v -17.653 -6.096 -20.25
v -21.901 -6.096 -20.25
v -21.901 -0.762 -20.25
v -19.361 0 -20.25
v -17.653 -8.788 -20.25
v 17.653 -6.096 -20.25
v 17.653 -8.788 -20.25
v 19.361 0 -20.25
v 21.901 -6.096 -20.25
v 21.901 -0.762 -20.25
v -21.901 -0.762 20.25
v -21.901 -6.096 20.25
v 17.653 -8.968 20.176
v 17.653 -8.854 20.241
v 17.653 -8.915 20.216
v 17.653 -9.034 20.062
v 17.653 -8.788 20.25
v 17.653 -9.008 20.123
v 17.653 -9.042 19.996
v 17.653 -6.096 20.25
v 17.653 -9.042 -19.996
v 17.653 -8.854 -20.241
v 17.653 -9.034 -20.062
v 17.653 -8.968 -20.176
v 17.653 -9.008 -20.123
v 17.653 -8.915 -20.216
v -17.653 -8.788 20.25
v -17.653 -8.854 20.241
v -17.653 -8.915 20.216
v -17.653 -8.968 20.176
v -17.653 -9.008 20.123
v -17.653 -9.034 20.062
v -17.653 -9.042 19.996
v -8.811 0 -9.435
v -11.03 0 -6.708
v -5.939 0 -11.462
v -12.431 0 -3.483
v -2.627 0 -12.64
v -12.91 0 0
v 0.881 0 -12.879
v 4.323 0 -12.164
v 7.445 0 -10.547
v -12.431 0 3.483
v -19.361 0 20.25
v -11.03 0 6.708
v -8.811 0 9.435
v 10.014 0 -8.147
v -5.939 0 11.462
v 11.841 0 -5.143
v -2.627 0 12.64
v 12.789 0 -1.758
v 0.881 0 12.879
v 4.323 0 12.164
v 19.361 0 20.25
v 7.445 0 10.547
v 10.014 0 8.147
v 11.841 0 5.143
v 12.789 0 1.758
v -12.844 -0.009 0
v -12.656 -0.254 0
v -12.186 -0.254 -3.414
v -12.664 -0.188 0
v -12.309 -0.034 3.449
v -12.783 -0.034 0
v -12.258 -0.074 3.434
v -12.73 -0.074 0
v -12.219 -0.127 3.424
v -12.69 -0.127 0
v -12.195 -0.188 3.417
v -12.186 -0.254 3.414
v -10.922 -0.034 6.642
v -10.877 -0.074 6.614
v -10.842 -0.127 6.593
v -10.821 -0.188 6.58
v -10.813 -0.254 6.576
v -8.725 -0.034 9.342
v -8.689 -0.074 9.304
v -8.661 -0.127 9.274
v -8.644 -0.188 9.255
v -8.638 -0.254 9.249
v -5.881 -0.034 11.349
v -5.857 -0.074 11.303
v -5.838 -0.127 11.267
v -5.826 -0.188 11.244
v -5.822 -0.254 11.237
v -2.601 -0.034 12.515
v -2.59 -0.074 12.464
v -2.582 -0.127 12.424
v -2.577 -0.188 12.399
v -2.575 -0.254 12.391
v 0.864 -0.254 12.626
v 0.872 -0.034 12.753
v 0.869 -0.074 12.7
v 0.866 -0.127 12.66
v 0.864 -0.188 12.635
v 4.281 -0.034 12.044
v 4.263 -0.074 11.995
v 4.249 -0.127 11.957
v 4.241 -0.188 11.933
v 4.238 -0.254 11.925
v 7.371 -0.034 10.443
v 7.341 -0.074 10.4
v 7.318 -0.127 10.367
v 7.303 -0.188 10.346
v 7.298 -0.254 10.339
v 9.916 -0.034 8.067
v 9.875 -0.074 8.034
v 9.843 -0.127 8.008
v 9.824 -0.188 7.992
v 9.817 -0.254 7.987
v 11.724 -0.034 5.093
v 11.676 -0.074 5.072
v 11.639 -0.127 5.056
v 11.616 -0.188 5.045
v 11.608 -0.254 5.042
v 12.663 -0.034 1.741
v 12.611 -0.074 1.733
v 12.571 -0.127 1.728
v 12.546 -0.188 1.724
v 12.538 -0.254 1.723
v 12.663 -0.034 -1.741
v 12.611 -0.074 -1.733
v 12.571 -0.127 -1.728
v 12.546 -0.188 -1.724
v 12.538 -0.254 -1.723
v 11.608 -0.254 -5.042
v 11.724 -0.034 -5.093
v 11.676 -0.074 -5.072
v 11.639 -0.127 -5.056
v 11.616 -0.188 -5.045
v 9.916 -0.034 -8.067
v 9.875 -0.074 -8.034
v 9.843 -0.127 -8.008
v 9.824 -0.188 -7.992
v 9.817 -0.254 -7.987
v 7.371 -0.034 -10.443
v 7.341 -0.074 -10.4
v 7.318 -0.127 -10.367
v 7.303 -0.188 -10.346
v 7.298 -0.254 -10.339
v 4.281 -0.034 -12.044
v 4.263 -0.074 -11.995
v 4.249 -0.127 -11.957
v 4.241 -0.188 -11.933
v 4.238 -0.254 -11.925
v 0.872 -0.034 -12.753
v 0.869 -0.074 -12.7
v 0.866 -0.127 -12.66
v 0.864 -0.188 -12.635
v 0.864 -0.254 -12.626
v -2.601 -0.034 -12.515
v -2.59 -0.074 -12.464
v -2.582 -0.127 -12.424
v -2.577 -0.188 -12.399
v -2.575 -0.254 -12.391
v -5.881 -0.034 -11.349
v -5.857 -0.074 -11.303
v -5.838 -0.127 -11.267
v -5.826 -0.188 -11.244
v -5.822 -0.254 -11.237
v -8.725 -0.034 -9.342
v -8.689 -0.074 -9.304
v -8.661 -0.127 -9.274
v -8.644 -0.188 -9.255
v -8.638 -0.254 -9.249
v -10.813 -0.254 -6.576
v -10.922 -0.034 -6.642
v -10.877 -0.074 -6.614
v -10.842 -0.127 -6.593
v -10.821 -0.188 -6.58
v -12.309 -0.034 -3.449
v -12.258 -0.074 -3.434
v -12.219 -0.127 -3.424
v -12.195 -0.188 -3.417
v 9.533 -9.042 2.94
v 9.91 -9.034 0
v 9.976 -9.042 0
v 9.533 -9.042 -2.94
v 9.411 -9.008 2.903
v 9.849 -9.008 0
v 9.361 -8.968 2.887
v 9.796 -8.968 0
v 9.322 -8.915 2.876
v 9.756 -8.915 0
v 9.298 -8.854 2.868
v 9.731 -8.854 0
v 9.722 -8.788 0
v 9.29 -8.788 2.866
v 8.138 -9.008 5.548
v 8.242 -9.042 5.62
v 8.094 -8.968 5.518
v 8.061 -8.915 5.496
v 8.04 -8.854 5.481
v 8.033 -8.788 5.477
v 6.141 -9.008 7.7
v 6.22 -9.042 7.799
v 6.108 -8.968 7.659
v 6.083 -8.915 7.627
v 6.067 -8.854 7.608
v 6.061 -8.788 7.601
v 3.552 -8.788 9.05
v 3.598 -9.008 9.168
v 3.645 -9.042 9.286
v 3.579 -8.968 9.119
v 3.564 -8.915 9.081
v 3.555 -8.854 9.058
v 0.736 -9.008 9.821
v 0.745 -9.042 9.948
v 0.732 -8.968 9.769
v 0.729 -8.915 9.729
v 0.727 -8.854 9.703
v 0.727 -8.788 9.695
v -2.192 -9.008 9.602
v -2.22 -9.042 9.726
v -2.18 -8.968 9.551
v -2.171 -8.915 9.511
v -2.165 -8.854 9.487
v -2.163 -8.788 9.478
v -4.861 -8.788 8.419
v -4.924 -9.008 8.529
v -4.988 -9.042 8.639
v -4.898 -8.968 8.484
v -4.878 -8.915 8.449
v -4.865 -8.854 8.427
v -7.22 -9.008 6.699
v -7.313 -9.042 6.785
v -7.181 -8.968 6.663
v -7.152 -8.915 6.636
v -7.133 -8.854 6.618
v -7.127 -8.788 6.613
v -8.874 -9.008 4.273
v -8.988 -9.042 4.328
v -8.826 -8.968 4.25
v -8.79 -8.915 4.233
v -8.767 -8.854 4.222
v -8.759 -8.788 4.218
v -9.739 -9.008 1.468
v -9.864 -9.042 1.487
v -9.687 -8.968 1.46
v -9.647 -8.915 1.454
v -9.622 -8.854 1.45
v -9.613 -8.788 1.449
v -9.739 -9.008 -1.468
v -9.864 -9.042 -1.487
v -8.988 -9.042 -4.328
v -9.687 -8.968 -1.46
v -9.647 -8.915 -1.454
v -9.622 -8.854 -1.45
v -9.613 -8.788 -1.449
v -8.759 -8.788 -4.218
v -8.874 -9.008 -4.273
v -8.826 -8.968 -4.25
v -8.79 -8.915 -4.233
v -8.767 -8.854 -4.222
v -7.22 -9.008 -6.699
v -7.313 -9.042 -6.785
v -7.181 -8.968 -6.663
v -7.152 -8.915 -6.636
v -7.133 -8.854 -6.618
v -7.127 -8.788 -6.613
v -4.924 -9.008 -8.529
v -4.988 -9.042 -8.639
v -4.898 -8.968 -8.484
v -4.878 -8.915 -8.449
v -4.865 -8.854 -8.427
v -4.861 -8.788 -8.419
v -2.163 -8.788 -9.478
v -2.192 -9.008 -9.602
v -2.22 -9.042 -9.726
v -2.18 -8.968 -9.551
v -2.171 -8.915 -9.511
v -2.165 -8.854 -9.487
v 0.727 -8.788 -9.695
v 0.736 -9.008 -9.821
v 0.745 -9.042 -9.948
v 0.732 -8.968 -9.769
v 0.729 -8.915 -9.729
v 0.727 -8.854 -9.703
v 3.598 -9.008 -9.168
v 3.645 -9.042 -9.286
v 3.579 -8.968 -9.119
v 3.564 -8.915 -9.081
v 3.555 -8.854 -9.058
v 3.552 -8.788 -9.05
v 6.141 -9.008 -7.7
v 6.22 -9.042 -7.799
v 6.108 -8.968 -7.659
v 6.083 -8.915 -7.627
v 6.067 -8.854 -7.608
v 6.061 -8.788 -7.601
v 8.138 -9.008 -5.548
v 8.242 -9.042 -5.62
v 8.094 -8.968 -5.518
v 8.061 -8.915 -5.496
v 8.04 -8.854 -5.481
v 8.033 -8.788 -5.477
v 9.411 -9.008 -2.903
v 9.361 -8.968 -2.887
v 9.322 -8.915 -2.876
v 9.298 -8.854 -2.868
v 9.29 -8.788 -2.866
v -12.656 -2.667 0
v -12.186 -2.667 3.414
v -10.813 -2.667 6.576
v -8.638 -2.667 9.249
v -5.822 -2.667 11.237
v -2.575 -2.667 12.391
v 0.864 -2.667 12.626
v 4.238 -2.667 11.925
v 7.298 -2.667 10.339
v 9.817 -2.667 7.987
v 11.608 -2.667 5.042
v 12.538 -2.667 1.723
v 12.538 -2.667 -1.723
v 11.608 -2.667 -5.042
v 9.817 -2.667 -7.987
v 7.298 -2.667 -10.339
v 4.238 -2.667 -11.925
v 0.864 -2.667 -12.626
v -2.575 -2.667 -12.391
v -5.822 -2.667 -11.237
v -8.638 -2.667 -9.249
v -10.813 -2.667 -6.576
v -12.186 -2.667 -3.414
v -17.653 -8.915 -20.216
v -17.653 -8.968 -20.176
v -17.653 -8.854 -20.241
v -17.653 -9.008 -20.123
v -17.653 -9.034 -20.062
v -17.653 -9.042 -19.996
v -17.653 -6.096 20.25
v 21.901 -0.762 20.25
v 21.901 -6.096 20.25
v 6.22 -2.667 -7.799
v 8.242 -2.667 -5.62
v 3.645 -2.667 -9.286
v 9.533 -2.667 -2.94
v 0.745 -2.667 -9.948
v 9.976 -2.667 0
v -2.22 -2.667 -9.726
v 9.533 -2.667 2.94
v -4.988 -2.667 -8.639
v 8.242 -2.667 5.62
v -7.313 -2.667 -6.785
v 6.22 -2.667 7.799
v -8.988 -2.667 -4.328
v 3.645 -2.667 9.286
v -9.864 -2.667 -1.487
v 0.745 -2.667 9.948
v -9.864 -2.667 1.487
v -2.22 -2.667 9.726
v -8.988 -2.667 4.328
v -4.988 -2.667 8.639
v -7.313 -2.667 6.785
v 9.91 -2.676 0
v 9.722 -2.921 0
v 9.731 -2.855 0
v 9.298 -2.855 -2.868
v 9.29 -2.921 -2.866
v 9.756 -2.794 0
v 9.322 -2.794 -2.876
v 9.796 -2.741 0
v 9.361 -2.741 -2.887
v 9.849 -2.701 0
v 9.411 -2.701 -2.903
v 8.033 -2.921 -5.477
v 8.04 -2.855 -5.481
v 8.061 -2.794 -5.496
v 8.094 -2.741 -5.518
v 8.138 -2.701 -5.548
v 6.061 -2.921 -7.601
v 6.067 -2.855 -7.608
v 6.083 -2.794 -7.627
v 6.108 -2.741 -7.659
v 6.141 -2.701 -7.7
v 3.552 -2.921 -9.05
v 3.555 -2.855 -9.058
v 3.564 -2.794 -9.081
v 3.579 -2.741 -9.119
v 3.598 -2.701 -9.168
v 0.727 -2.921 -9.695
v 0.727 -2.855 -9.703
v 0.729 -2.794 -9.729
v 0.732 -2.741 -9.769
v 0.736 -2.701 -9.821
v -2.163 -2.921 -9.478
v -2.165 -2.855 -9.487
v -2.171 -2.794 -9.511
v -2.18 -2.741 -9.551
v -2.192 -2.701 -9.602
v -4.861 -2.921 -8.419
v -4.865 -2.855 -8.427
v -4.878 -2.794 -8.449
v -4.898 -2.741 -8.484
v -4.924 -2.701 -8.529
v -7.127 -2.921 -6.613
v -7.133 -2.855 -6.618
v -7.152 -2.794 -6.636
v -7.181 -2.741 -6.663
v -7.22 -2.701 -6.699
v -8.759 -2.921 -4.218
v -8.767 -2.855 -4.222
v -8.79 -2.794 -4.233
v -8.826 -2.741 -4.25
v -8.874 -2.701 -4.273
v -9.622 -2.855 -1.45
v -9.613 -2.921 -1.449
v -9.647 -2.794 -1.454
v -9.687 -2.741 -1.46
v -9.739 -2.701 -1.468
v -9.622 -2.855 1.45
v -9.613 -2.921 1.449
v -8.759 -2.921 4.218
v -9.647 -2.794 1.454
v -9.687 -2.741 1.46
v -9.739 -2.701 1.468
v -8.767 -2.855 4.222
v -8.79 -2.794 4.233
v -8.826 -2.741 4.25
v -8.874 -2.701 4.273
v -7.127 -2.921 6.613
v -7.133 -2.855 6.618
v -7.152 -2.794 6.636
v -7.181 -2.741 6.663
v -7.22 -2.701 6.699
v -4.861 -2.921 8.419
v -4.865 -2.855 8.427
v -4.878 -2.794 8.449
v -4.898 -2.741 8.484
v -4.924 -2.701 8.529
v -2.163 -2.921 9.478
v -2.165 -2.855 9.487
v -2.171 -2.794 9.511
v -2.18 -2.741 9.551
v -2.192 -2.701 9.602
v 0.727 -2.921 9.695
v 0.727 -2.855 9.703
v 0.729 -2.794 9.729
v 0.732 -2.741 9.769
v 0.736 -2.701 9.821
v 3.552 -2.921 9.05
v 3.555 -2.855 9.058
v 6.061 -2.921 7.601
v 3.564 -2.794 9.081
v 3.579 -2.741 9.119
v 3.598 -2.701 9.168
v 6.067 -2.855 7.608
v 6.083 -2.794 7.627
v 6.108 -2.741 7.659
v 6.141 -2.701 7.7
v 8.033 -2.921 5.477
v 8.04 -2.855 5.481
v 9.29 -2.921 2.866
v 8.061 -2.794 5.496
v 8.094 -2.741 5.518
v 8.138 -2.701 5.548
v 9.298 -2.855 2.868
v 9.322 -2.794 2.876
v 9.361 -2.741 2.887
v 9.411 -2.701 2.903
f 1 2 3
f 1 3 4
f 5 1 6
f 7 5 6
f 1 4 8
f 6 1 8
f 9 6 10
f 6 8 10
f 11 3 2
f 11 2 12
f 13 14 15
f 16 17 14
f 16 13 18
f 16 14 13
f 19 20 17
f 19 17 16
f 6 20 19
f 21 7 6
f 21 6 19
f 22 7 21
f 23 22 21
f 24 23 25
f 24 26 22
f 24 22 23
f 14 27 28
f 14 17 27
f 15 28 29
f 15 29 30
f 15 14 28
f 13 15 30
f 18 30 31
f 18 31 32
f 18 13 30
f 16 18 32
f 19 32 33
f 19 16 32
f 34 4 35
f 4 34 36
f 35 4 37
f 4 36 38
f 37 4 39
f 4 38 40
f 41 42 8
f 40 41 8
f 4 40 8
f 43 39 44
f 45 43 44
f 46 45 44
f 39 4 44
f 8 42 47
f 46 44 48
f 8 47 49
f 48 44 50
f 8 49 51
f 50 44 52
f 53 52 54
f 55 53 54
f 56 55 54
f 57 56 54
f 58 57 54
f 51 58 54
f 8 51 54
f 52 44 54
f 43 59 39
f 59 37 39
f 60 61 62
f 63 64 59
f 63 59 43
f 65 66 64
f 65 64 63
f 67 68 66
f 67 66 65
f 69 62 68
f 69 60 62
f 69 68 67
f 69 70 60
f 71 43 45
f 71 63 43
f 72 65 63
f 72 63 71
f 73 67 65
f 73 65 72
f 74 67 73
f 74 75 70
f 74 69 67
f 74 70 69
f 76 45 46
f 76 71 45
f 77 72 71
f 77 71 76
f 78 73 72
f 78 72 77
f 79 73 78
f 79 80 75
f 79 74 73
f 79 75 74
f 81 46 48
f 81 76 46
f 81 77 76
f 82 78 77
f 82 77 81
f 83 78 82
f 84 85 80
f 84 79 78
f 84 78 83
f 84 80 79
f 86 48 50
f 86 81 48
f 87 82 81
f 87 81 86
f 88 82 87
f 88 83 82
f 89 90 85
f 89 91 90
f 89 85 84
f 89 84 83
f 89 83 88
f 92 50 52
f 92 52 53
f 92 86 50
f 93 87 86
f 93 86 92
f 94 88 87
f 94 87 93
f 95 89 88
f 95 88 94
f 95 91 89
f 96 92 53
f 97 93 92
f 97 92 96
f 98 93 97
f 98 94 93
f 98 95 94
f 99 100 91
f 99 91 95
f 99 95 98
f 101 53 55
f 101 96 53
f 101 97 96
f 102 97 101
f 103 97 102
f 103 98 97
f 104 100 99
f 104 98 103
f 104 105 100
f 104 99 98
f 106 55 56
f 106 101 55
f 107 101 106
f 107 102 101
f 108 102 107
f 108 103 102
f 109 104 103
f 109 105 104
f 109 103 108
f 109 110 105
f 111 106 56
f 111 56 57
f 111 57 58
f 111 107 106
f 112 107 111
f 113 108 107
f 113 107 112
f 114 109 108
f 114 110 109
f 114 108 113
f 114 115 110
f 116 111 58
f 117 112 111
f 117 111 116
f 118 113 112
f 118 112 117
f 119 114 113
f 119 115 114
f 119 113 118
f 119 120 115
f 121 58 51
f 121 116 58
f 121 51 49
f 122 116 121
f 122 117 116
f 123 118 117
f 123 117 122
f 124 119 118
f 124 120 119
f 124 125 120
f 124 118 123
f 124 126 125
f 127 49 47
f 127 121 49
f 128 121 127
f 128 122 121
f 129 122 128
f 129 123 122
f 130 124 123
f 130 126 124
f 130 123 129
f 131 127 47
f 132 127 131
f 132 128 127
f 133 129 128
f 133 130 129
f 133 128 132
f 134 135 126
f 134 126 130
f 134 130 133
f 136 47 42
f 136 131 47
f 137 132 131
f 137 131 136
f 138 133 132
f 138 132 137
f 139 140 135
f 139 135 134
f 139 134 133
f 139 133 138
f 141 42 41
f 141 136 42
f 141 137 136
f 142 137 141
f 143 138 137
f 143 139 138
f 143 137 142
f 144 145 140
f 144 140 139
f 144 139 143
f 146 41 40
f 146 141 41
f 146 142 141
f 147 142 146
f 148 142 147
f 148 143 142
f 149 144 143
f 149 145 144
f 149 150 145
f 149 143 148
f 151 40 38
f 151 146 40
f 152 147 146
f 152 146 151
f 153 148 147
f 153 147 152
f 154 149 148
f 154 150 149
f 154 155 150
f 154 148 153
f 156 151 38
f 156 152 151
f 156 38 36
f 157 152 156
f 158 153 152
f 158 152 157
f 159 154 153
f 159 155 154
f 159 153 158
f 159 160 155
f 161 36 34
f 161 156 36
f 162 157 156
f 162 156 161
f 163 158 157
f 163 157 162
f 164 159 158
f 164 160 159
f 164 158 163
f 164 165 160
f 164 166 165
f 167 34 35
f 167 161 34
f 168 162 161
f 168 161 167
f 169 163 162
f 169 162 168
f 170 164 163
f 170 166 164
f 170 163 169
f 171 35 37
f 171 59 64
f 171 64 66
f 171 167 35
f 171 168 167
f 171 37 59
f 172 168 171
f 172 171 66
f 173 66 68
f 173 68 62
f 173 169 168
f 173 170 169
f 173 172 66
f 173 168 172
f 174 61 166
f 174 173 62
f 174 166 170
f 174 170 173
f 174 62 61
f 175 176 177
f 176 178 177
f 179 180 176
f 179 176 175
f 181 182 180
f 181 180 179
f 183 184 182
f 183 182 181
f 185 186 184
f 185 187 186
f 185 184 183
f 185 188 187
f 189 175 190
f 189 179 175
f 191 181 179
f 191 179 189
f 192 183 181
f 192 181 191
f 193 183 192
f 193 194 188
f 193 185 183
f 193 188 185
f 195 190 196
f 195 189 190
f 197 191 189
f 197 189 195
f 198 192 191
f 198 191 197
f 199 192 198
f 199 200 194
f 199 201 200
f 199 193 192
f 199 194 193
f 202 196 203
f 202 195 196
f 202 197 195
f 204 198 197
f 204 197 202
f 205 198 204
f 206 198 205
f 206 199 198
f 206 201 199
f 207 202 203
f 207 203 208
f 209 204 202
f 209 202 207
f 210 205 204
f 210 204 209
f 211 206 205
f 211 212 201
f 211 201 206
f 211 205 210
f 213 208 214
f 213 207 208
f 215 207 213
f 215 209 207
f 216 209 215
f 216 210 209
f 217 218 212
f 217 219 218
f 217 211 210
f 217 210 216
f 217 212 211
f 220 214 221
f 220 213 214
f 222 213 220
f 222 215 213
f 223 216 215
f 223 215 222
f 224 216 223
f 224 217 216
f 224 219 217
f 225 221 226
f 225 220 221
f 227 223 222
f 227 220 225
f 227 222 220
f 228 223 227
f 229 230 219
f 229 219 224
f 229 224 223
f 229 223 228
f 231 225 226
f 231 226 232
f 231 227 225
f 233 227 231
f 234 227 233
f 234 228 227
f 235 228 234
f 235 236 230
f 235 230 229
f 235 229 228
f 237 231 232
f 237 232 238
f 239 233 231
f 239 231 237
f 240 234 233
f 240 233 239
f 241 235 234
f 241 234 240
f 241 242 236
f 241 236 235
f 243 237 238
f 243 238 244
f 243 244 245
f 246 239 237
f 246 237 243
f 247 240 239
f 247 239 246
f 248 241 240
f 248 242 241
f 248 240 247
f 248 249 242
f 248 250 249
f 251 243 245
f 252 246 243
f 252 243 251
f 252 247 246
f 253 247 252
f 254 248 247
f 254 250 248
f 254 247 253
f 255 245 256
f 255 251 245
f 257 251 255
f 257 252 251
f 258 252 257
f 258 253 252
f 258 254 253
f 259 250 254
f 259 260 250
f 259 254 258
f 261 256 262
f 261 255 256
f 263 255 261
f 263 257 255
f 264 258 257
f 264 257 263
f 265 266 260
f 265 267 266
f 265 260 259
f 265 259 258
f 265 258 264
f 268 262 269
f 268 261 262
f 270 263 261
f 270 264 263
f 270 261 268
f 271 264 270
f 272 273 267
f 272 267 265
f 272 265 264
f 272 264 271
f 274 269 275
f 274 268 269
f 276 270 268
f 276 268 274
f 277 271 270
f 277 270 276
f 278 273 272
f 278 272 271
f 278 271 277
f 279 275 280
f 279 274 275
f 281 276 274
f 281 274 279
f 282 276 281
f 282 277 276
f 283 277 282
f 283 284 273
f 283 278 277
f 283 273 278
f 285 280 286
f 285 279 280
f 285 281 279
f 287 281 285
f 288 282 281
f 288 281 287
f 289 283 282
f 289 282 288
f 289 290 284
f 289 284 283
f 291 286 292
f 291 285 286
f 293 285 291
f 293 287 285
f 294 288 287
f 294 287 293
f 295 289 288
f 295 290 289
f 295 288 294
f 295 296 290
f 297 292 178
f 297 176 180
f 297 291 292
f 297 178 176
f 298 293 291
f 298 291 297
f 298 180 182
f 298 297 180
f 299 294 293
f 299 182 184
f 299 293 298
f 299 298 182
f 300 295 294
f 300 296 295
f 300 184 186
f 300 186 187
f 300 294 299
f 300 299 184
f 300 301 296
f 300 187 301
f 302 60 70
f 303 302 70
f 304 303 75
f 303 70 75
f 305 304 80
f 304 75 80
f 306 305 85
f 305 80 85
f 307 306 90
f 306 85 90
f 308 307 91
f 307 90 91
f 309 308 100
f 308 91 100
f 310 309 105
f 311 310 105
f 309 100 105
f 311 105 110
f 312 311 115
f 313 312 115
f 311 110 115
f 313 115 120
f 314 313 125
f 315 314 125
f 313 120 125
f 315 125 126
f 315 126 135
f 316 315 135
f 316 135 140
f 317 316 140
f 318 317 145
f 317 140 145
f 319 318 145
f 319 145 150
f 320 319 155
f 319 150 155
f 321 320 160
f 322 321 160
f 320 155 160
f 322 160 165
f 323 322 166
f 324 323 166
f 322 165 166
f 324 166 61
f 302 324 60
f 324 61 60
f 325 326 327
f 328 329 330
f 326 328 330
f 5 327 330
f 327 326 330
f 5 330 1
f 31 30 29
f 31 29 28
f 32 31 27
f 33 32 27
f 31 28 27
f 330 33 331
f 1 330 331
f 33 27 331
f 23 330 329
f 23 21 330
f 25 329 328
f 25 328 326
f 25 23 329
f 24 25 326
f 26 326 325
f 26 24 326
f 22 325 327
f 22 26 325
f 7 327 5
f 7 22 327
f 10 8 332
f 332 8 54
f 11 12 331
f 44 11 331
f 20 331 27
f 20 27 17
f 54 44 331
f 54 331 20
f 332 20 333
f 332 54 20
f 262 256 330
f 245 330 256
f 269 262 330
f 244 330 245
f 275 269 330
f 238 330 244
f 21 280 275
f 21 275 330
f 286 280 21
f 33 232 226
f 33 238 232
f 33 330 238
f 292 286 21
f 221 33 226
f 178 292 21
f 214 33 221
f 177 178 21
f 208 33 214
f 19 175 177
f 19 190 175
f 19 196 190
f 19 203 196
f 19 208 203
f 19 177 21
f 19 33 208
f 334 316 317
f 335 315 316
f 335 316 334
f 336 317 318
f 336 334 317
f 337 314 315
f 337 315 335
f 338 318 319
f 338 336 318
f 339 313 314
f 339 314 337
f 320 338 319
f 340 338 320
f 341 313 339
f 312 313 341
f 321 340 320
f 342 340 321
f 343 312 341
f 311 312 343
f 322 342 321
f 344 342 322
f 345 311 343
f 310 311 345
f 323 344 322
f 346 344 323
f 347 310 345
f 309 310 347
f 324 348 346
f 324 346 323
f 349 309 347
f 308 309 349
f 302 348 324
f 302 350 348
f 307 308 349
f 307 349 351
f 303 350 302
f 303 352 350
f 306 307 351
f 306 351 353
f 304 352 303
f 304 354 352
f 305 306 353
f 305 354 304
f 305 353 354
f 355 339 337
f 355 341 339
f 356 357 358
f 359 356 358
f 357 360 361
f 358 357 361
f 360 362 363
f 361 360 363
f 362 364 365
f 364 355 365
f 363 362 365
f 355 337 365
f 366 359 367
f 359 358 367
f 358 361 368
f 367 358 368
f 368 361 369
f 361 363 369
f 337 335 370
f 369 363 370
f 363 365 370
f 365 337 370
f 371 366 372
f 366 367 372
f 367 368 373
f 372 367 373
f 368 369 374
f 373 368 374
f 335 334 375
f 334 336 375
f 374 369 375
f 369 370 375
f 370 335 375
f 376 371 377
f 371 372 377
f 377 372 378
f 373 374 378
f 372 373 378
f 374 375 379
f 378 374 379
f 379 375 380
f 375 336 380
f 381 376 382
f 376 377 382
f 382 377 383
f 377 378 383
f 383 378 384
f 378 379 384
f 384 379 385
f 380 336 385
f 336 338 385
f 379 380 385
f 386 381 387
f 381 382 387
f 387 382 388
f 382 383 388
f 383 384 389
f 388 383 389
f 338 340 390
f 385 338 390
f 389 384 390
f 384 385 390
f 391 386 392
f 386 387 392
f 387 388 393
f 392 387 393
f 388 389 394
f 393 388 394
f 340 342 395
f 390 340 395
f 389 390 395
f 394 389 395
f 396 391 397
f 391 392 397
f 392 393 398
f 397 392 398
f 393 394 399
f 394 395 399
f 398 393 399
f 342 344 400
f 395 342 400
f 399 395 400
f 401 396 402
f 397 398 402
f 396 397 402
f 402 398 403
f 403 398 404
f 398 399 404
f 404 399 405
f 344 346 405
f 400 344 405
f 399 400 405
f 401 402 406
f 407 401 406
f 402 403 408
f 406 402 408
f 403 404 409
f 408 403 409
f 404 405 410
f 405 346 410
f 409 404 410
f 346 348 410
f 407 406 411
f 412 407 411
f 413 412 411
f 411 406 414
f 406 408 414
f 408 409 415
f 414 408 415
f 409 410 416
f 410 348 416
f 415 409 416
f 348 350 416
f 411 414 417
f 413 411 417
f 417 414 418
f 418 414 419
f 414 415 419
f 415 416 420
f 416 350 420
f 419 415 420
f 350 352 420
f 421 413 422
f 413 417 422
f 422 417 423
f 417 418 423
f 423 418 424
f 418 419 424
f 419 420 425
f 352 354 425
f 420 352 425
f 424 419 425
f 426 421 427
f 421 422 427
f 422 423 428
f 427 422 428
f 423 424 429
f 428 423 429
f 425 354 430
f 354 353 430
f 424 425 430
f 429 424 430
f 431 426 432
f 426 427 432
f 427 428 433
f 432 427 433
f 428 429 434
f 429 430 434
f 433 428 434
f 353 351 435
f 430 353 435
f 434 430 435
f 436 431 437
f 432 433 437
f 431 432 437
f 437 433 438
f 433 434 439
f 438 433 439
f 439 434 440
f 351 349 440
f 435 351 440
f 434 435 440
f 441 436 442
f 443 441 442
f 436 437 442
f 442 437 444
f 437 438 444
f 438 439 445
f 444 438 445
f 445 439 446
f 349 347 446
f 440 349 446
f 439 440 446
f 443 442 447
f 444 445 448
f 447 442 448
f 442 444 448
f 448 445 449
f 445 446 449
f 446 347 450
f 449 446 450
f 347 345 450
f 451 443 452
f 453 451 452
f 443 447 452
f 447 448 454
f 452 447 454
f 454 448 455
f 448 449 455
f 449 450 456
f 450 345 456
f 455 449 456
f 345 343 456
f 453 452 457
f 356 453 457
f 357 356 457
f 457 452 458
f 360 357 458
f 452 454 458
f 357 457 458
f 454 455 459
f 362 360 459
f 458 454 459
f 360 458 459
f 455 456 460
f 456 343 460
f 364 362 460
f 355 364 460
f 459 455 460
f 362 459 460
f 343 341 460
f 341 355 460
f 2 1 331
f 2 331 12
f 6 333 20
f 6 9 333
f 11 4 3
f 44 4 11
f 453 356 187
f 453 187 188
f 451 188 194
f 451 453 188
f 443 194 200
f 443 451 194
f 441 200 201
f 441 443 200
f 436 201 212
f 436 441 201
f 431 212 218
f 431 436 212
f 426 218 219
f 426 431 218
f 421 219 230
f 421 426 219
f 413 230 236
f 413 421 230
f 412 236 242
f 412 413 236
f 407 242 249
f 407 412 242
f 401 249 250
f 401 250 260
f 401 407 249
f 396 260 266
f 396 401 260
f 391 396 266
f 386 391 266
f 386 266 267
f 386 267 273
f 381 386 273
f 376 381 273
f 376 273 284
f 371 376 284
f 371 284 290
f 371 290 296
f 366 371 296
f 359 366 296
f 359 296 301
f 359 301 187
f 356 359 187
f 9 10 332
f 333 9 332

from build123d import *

# Parameters (mm, degrees)
F0_W       = 43.8023
F0_H       = 40.5003
F0_R       = 9.72185
F1_DEPTH   = 9.0424
F3_DEPTH   = 25.4
F4_SIZE2   = 2.54
F4_SIZE    = 0.762
F4_2_SIZE2 = 2.54
F4_2_SIZE  = 0.762
F5_R       = 12.65555
F6_DEPTH   = 2.667
F7_R       = 0.254


with BuildPart() as f1:
    # F0 (on Front) → F1 (new body)
    with BuildSketch(Plane.XZ):
        Rectangle(F0_W, F0_H)
        Circle(F0_R, mode=Mode.SUBTRACT)
    extrude(amount=F1_DEPTH)

    # F2 (on Top) → F3 (cut, symmetric)
    with BuildSketch(Plane.XY):
        Polygon((17.653, -6.096), (17.653, -9.144), (17.653, -9.8752817139), (22.691456601, -9.8752817139), (22.691456601, -6.096), align=None)
        Polygon((-17.653, -9.8752817139), (-17.653, -9.144), (-17.653, -6.096), (-22.691456601, -6.096), (-22.691456601, -9.8752817139), align=None)
    extrude(amount=F3_DEPTH, both=True, mode=Mode.SUBTRACT)

    # F4
    f4_edges = [f1.edges().sort_by_distance(p)[0] for p in [
        (-21.90115, 0, 0),
    ]]
    f4_side = f1.faces().sort_by_distance((-21.90115, -3.048, 0))[0]
    chamfer(f4_edges, length=F4_SIZE, length2=F4_SIZE2, reference=f4_side)

    # F4#2
    f4_2_edges = [f1.edges().sort_by_distance(p)[0] for p in [
        (21.90115, 0, 0),
    ]]
    f4_2_side = f1.faces().sort_by_distance((21.90115, -3.048, 0))[0]
    chamfer(f4_2_edges, length=F4_2_SIZE, length2=F4_2_SIZE2, reference=f4_2_side)

    # F5 (on face) → F6 (cut)
    with BuildSketch(Plane(origin=(0, 0, 0), x_dir=(-1, 0, 0), z_dir=(0, 1, 0))):
        Circle(F5_R)
    extrude(amount=-F6_DEPTH, mode=Mode.SUBTRACT)

    # F7
    f7_edges = [f1.edges().sort_by_distance(p)[0] for p in [
        (12.65555, 0, 0),
        (-9.72185, -2.667, 0),
        (0, -9.0424, -20.25015),
        (0, -9.0424, 20.25015),
        (-9.72185, -9.0424, 0),
    ]]
    fillet(f7_edges, radius=F7_R)


solid = f1.part
